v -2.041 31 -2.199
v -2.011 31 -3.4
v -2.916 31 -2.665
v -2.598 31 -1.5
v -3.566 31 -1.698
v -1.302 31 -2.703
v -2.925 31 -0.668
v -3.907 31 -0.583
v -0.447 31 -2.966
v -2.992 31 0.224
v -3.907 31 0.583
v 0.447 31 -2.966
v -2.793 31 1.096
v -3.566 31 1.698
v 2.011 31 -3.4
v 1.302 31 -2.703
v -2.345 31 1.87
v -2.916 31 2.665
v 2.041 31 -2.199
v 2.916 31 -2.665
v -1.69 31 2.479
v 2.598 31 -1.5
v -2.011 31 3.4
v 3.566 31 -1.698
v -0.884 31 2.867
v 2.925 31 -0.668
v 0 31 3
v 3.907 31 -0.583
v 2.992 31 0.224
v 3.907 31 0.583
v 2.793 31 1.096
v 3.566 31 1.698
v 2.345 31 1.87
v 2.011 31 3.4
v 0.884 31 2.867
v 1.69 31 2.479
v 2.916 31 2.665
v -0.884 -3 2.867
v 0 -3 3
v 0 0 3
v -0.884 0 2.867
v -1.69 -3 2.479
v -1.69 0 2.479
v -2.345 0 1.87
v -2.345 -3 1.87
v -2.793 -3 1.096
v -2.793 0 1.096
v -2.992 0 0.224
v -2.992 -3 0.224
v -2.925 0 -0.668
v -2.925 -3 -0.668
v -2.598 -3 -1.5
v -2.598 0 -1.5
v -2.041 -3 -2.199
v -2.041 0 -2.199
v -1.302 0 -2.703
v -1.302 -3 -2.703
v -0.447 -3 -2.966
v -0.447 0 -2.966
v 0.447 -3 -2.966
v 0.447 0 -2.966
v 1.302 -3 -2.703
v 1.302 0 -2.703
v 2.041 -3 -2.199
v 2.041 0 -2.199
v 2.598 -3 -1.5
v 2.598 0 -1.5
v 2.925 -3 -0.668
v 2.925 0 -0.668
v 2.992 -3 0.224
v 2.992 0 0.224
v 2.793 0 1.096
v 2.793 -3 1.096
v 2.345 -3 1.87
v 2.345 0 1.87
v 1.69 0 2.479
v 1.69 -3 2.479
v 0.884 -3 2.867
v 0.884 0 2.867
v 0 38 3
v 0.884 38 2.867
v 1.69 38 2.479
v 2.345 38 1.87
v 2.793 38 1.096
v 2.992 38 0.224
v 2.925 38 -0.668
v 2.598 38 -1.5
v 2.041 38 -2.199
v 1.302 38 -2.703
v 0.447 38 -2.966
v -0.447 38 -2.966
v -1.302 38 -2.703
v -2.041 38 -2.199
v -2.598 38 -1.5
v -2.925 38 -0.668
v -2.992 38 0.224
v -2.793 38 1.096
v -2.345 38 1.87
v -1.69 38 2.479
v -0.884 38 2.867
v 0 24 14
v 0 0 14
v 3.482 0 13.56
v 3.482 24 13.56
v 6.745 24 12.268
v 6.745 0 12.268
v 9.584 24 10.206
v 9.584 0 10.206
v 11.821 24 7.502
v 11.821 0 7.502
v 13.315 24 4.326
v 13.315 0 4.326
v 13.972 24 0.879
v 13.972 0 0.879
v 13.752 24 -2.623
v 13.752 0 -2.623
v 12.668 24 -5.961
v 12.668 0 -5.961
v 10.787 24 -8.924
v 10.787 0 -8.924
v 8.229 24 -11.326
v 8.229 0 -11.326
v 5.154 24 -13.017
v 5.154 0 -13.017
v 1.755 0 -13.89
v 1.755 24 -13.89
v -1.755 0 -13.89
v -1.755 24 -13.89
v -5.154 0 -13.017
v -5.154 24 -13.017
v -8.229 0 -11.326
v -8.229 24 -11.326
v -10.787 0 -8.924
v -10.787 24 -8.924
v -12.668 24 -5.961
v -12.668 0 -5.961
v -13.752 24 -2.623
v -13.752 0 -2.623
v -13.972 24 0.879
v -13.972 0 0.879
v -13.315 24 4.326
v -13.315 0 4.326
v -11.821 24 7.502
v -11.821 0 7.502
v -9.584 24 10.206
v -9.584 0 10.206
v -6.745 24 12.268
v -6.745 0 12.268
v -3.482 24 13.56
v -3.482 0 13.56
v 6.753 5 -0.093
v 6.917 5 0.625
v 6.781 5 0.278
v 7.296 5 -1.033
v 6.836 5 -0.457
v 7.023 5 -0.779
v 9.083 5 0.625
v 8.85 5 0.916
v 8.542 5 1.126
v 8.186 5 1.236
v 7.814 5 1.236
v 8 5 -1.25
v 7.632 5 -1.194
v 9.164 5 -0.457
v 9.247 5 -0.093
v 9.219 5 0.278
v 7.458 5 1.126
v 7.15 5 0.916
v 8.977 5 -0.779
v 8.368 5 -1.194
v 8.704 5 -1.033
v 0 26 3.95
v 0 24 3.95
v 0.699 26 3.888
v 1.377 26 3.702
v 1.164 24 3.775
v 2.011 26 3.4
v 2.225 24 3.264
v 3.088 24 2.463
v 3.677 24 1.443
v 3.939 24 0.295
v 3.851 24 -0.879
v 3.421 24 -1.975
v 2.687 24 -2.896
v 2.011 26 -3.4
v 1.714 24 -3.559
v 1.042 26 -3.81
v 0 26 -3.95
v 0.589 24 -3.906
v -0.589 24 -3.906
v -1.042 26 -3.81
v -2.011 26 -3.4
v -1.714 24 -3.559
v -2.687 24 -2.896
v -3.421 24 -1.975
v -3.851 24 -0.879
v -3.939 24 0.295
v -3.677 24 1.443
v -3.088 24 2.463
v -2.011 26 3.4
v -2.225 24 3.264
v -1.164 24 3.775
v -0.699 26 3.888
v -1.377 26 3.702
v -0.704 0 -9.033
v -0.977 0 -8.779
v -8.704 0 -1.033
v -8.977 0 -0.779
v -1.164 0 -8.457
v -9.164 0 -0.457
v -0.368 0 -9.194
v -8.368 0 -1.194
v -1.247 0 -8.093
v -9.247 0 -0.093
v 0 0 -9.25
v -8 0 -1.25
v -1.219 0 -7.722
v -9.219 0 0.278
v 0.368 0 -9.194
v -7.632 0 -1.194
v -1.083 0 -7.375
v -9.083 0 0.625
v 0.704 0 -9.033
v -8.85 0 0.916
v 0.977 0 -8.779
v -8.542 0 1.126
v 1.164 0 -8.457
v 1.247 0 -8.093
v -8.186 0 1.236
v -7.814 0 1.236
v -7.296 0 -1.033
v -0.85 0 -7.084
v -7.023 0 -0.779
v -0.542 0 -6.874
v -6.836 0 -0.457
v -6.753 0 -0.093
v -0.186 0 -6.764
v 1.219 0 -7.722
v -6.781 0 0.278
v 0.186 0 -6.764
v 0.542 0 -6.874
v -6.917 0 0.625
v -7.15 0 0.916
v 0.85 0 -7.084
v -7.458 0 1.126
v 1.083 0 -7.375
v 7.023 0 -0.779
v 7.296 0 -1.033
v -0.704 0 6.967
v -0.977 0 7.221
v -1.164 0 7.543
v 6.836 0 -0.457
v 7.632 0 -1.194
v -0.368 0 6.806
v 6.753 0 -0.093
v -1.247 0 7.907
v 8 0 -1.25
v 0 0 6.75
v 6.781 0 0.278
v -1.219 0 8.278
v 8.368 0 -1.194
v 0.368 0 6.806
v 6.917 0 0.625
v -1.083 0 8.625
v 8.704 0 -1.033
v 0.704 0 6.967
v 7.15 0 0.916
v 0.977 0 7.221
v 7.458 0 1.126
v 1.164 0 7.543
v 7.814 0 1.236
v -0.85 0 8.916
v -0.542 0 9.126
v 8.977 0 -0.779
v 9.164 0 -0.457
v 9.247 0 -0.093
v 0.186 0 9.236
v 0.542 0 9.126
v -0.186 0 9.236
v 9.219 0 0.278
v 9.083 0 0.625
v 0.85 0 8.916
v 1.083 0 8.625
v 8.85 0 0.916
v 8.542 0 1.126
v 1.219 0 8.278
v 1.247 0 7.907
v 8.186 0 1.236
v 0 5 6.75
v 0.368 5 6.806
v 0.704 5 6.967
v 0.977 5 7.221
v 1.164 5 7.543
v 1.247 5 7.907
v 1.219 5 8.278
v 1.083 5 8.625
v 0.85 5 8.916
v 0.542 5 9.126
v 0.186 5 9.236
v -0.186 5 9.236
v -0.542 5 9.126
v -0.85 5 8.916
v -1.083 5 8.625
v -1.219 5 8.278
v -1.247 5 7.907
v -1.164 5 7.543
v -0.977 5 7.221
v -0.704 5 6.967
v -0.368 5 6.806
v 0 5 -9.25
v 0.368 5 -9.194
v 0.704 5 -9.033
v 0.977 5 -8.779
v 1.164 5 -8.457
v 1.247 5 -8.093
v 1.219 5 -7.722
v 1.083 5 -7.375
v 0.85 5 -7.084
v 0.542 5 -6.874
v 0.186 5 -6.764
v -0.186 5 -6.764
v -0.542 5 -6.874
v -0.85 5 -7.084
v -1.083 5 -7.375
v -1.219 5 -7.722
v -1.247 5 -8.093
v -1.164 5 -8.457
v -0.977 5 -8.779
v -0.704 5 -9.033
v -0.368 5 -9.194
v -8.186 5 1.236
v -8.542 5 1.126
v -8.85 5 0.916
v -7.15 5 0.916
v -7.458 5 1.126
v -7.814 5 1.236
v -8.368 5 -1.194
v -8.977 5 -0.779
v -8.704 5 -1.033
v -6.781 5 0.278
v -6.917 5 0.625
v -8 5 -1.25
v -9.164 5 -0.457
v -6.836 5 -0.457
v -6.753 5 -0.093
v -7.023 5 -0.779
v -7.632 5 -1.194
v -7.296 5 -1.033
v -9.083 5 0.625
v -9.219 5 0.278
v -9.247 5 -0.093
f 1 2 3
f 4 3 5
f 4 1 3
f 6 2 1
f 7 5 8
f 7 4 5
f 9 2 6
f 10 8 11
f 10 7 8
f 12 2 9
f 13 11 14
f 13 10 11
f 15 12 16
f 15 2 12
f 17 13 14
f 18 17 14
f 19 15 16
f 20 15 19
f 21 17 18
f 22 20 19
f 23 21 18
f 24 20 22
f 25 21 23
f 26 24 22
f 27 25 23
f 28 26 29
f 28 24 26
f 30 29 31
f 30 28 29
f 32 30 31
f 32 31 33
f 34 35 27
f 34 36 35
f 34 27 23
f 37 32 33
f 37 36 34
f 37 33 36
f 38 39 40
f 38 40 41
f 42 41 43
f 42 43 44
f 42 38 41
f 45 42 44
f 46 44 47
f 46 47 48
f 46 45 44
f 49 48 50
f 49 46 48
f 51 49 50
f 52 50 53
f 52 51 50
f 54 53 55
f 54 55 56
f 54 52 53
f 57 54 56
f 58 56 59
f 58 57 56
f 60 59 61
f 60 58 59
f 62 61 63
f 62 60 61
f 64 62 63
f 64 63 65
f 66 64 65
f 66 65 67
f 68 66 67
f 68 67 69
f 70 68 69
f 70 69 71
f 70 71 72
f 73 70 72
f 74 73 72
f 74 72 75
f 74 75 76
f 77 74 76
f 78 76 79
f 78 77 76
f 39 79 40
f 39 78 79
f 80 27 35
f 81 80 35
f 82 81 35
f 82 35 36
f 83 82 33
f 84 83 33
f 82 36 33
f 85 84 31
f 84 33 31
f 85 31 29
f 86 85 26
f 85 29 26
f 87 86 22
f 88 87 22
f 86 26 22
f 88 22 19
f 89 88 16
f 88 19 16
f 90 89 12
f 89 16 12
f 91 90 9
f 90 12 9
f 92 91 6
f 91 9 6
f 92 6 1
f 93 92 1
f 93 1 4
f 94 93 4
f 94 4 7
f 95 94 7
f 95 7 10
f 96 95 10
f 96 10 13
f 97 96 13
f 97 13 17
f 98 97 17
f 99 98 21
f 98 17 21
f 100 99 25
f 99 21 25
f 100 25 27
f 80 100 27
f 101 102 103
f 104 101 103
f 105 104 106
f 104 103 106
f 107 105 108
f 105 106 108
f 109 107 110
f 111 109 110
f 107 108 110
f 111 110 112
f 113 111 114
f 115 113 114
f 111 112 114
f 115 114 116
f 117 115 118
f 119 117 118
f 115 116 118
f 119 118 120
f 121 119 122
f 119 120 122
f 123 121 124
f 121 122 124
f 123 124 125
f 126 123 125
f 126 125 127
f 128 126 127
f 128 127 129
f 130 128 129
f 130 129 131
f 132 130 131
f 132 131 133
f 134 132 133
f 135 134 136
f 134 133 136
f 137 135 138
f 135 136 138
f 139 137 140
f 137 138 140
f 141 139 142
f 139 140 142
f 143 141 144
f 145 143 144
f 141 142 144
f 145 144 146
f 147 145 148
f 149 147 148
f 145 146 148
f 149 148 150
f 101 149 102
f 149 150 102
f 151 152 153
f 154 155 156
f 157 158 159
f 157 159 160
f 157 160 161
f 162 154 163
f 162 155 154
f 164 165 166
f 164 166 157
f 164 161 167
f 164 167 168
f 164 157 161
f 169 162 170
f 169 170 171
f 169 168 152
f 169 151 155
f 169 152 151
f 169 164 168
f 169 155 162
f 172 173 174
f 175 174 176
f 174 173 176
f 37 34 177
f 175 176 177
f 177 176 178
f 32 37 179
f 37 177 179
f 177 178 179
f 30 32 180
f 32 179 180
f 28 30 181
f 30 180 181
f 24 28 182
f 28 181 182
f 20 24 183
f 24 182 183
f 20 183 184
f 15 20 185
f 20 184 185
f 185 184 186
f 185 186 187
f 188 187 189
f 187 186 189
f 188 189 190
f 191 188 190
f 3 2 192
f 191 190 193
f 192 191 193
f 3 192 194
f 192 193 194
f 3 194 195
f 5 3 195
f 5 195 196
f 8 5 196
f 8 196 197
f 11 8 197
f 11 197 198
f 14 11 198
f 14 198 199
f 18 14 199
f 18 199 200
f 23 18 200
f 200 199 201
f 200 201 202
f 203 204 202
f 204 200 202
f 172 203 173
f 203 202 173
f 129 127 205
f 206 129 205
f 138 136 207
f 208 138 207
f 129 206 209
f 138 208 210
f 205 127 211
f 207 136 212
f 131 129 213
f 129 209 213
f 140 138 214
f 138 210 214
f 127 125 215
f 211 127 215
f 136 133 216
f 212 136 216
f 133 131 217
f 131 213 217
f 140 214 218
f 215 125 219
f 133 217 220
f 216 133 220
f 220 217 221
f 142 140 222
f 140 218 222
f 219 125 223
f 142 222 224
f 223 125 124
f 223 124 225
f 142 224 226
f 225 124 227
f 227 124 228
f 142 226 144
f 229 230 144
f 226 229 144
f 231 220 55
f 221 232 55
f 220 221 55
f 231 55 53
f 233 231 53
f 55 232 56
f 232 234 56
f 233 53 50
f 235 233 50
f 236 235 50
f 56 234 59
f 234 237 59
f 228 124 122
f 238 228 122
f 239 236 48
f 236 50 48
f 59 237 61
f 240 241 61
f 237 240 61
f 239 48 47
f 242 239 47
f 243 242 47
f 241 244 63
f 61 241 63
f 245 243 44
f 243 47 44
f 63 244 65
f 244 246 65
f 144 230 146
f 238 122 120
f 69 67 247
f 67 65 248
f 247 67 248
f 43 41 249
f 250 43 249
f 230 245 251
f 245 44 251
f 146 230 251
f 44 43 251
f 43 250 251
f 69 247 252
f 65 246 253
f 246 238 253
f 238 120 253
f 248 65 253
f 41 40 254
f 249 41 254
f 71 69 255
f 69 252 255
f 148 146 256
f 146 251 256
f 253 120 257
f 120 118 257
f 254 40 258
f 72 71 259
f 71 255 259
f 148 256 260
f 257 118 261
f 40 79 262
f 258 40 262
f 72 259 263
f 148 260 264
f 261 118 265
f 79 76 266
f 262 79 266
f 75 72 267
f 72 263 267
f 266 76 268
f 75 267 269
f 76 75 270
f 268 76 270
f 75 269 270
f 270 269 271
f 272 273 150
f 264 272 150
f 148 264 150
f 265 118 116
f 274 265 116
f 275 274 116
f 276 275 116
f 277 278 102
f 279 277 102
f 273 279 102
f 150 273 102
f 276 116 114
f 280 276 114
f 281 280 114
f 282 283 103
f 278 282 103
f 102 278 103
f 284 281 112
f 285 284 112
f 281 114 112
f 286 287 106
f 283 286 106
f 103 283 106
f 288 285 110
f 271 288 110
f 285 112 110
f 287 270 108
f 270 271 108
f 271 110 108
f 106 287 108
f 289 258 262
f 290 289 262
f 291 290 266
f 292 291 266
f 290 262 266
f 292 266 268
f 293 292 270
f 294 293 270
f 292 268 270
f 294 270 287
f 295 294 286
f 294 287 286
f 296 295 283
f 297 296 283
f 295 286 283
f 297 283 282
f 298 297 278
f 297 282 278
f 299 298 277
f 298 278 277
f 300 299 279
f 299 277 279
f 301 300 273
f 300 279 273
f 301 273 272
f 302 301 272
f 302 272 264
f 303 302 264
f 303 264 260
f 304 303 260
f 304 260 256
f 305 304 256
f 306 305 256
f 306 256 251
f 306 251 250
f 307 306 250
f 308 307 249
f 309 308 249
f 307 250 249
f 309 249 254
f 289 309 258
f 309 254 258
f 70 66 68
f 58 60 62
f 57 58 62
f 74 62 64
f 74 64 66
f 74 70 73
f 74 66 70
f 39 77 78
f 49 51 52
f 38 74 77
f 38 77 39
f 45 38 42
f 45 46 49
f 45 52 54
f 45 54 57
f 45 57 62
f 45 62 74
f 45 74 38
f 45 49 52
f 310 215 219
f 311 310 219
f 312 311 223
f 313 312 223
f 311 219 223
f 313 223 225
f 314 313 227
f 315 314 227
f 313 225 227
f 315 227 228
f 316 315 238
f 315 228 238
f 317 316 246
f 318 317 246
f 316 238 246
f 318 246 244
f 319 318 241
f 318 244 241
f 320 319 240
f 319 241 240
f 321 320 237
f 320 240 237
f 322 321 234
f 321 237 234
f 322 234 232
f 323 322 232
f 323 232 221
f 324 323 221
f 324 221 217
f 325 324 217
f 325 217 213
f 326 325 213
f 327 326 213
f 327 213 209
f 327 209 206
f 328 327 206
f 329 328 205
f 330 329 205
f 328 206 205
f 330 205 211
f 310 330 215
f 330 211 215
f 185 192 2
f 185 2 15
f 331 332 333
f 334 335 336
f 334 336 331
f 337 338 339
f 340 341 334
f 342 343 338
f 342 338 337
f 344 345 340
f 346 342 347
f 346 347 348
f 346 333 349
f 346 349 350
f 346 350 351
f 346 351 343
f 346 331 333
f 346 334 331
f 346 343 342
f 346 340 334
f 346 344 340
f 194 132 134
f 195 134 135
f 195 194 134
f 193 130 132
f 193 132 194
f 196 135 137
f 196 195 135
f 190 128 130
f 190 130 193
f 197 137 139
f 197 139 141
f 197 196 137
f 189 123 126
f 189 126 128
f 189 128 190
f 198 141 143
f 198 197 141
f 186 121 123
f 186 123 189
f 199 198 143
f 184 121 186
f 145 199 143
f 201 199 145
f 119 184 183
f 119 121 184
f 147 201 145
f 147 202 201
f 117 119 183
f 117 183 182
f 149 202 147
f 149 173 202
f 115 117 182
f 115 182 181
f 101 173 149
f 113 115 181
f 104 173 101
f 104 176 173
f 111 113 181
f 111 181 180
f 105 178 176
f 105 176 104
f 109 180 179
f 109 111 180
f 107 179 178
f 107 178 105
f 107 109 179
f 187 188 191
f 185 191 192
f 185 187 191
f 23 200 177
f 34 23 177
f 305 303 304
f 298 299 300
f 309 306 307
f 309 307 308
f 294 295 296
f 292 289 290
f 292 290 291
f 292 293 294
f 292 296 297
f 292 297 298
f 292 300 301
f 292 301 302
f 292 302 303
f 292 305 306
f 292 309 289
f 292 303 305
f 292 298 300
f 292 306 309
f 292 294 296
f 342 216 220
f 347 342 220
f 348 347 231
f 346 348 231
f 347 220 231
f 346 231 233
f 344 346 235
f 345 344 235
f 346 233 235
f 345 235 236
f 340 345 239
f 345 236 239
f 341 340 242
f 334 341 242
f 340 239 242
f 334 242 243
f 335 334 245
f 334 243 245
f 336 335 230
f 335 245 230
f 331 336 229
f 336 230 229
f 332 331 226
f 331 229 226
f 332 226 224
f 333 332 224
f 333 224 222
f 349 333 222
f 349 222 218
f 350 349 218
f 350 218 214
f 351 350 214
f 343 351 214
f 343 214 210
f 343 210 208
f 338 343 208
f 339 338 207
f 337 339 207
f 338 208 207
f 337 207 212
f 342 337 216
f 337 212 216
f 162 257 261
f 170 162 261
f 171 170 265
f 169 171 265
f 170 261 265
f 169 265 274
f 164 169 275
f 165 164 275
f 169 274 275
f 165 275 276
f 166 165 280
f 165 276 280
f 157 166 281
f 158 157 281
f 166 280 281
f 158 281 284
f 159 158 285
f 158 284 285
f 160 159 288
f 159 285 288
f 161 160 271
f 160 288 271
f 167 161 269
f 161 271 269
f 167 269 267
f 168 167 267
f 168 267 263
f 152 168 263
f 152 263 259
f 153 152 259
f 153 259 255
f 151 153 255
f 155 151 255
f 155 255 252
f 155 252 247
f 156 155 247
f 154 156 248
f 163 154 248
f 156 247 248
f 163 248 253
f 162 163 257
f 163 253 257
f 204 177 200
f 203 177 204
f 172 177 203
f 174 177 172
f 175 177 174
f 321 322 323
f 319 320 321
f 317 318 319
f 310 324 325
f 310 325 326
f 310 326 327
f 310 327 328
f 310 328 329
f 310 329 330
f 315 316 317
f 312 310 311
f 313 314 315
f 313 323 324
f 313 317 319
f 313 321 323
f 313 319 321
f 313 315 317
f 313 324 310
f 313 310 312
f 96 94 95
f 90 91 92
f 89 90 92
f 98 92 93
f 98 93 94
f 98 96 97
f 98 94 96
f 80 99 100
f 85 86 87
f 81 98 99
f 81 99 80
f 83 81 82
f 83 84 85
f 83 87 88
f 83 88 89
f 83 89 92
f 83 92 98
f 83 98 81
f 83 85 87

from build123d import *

# Parameters (mm, degrees)
SKETCH2_R           = 14
BOSS_EXTRUDE1_DEPTH = 24
SKETCH3_R           = 3.95
BOSS_EXTRUDE2_DEPTH = 7
SKETCH4_R           = 3
BOSS_EXTRUDE3_DEPTH = 7
SKETCH6_R           = 1.25
CUT_EXTRUDE1_DEPTH  = 5
EXTRUDE_START       = 3
SKETCH_1_R          = 3
EXTRUDE_1_DEPTH     = 3
CUT_EXTRUDE2_START  = -5
CUT_EXTRUDE2_DEPTH  = 5


with BuildPart() as part:
    # Sketch2 → Boss-Extrude1 (new body)
    with BuildSketch(Plane(origin=(0, 0, 0), x_dir=(1, 0, 0), z_dir=(0, 1, 0))):
        with Locations(Location((0, 0, 0), (0, 0, 270))):
            Circle(SKETCH2_R)
    extrude(amount=BOSS_EXTRUDE1_DEPTH)

    # Sketch3 → Boss-Extrude2 (add)
    with BuildSketch(Plane(origin=(0, 24, 0), x_dir=(1, 0, 0), z_dir=(0, 1, 0))):
        with Locations(Location((0, 0, 0), (0, 0, 270))):
            Circle(SKETCH3_R)
    extrude(amount=BOSS_EXTRUDE2_DEPTH)

    # Sketch4 → Boss-Extrude3 (add)
    with BuildSketch(Plane(origin=(0, 31, 0), x_dir=(1, 0, 0), z_dir=(0, 1, 0))):
        with Locations(Location((0, 0, 0), (0, 0, 270))):
            Circle(SKETCH4_R)
    extrude(amount=BOSS_EXTRUDE3_DEPTH)

    # Sketch6 → Cut-Extrude1 (cut)
    with BuildSketch(Plane.XZ):
        with Locations(Location((8, 0, 0), (0, 0, 270))):
            Circle(SKETCH6_R)
        with Locations(Location((0, -8, 0), (0, 0, 270))):
            Circle(SKETCH6_R)
        with Locations(Location((-8, 0, 0), (0, 0, 270))):
            Circle(SKETCH6_R)
        with Locations(Location((0, 8, 0), (0, 0, 270))):
            Circle(SKETCH6_R)
    extrude(amount=-CUT_EXTRUDE1_DEPTH, mode=Mode.SUBTRACT)

    # 草图1 → 凸台-拉伸1 (add)
    with BuildSketch(Plane.XZ.offset(EXTRUDE_START)):
        with Locations(Location((0, 0, 0), (0, 0, 90))):
            Circle(SKETCH_1_R)
    extrude(amount=-EXTRUDE_1_DEPTH)

    # Sketch7 → Cut-Extrude2 (cut)
    with BuildSketch(Plane(origin=(0, 31, 0), x_dir=(1, 0, 0), z_dir=(0, 1, 0)).offset(CUT_EXTRUDE2_START)):
        with BuildLine():
            Line((-2.010596926, 3.4), (2.010596926, 3.4))
            ThreePointArc((2.010596926, 3.4), (0, 3.95), (-2.010596926, 3.4))
        make_face()
        with BuildLine():
            Line((-2.010596926, -3.4), (2.010596926, -3.4))
            ThreePointArc((2.010596926, -3.4), (0, -3.95), (-2.010596926, -3.4))
        make_face()
    extrude(amount=CUT_EXTRUDE2_DEPTH, mode=Mode.SUBTRACT)


solid = part.part
